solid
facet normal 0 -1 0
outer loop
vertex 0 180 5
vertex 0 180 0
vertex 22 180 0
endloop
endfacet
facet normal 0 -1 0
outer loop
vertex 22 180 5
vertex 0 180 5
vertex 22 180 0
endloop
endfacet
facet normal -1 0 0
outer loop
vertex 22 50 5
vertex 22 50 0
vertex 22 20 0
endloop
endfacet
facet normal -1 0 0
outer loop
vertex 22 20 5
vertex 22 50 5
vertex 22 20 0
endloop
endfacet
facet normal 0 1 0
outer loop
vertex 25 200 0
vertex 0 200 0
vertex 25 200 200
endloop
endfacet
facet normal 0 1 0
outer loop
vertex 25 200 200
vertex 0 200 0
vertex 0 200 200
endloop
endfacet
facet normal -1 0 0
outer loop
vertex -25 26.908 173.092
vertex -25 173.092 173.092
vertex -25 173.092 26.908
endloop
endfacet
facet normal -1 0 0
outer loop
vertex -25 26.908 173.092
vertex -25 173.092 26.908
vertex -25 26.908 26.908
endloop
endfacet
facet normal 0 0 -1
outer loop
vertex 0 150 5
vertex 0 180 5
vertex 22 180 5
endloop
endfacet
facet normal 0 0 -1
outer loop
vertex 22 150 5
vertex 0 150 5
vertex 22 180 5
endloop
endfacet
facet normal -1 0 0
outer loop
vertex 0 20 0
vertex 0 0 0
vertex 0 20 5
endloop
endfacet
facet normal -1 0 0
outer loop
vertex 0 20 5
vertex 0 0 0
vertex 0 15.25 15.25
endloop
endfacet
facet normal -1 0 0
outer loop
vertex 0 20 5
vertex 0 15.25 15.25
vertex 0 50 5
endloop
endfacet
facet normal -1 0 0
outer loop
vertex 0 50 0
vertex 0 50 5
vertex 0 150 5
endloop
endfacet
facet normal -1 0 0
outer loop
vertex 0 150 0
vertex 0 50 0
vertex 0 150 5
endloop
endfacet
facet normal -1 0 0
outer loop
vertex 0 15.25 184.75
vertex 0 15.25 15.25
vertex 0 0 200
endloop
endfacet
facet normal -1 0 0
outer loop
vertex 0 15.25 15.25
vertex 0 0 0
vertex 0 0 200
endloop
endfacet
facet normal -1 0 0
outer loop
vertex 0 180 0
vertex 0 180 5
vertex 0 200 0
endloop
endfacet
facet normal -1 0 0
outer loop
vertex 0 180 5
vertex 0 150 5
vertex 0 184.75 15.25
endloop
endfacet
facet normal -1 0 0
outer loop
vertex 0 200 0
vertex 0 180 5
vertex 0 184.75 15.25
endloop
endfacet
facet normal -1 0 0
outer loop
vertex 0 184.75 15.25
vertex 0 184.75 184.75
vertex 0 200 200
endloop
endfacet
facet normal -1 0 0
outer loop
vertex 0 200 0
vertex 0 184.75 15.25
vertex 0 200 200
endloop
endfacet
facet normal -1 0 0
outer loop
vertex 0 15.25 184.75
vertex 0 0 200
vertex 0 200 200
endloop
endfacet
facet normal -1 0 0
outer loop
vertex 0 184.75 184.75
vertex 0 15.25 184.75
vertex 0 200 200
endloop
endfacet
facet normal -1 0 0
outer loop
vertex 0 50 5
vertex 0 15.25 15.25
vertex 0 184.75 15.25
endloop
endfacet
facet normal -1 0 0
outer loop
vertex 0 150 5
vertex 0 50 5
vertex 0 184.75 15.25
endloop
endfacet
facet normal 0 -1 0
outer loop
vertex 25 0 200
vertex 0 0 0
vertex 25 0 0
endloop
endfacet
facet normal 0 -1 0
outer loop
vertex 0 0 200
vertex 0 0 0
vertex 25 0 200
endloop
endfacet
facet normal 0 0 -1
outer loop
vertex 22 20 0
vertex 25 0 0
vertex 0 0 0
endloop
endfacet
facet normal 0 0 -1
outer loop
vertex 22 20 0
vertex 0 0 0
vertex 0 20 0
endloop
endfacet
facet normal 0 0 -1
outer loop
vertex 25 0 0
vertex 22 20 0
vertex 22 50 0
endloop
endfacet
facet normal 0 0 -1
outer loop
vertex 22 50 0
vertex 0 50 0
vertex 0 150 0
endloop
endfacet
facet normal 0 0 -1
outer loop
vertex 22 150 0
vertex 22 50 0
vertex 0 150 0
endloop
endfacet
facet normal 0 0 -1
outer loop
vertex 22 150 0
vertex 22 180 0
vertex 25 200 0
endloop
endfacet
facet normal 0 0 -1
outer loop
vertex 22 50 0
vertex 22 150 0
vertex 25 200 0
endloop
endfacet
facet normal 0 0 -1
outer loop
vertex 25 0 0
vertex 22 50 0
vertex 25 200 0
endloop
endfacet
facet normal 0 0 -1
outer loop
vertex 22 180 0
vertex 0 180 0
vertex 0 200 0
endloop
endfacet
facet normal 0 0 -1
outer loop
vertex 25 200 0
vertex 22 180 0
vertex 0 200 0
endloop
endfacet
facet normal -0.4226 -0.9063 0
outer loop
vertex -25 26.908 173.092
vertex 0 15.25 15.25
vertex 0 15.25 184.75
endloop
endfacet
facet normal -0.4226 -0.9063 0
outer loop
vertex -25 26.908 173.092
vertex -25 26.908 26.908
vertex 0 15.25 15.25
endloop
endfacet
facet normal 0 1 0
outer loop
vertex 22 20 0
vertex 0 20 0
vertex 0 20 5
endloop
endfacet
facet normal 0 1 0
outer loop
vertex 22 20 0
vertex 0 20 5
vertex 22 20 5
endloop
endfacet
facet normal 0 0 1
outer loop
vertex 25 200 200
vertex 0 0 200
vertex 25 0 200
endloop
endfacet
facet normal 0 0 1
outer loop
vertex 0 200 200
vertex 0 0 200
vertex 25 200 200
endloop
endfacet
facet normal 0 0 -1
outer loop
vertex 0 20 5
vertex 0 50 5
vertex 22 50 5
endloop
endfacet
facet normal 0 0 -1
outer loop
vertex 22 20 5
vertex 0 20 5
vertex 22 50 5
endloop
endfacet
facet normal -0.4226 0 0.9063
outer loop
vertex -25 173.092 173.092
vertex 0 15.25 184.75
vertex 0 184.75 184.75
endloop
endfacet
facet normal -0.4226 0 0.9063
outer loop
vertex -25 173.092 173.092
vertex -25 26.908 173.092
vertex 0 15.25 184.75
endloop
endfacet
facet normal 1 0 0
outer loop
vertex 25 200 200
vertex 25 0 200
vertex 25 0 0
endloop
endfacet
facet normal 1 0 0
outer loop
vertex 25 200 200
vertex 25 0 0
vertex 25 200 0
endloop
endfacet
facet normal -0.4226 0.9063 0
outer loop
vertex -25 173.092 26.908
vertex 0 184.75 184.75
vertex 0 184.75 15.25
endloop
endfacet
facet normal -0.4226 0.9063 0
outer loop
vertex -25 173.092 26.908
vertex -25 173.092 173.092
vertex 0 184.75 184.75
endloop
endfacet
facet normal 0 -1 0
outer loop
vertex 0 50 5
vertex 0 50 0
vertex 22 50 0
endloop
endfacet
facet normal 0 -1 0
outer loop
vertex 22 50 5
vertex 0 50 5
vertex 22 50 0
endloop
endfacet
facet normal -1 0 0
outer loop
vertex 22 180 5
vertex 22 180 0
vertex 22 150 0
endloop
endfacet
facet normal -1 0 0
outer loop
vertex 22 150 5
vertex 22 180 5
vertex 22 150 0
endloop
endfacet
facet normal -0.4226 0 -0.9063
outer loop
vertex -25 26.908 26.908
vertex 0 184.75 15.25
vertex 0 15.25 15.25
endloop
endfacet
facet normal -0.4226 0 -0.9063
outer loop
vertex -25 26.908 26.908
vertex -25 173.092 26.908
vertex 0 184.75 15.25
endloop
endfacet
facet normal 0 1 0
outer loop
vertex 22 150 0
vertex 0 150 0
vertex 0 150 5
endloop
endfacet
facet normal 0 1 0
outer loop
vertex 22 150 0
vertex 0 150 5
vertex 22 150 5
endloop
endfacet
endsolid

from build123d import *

# Parameters (mm, degrees)
F0_W     = 200
F0_H     = 200
F1_DEPTH = 25
F2_W     = 169.5
F2_H     = 169.5
F3_DEPTH = 25
F3_TAPER = 25
F4_W     = 22
F4_H     = 30
F5_DEPTH = 5


with BuildPart() as f1:
    # F0 (on Right) → F1 (new body)
    with BuildSketch(Plane.YZ):
        with Locations((100, 100)):
            Rectangle(F0_W, F0_H)
    extrude(amount=F1_DEPTH)

    # F2 (on face) → F3 (join)
    with BuildSketch(Plane(origin=(0, 0, 0), x_dir=(0, -1, 0), z_dir=(-1, 0, 0))):
        with Locations((-100, 100)):
            Rectangle(F2_W, F2_H)
    extrude(amount=F3_DEPTH, taper=F3_TAPER)

    # F4 (on face) → F5 (cut)
    with BuildSketch(Plane(origin=(0, 0, 0), x_dir=(1, 0, 0), z_dir=(0, 0, -1))):
        with Locations((11, -165)):
            Rectangle(F4_W, F4_H)
        with Locations((11, -35)):
            Rectangle(F4_W, F4_H)
    extrude(amount=-F5_DEPTH, mode=Mode.SUBTRACT)


solid = f1.part
